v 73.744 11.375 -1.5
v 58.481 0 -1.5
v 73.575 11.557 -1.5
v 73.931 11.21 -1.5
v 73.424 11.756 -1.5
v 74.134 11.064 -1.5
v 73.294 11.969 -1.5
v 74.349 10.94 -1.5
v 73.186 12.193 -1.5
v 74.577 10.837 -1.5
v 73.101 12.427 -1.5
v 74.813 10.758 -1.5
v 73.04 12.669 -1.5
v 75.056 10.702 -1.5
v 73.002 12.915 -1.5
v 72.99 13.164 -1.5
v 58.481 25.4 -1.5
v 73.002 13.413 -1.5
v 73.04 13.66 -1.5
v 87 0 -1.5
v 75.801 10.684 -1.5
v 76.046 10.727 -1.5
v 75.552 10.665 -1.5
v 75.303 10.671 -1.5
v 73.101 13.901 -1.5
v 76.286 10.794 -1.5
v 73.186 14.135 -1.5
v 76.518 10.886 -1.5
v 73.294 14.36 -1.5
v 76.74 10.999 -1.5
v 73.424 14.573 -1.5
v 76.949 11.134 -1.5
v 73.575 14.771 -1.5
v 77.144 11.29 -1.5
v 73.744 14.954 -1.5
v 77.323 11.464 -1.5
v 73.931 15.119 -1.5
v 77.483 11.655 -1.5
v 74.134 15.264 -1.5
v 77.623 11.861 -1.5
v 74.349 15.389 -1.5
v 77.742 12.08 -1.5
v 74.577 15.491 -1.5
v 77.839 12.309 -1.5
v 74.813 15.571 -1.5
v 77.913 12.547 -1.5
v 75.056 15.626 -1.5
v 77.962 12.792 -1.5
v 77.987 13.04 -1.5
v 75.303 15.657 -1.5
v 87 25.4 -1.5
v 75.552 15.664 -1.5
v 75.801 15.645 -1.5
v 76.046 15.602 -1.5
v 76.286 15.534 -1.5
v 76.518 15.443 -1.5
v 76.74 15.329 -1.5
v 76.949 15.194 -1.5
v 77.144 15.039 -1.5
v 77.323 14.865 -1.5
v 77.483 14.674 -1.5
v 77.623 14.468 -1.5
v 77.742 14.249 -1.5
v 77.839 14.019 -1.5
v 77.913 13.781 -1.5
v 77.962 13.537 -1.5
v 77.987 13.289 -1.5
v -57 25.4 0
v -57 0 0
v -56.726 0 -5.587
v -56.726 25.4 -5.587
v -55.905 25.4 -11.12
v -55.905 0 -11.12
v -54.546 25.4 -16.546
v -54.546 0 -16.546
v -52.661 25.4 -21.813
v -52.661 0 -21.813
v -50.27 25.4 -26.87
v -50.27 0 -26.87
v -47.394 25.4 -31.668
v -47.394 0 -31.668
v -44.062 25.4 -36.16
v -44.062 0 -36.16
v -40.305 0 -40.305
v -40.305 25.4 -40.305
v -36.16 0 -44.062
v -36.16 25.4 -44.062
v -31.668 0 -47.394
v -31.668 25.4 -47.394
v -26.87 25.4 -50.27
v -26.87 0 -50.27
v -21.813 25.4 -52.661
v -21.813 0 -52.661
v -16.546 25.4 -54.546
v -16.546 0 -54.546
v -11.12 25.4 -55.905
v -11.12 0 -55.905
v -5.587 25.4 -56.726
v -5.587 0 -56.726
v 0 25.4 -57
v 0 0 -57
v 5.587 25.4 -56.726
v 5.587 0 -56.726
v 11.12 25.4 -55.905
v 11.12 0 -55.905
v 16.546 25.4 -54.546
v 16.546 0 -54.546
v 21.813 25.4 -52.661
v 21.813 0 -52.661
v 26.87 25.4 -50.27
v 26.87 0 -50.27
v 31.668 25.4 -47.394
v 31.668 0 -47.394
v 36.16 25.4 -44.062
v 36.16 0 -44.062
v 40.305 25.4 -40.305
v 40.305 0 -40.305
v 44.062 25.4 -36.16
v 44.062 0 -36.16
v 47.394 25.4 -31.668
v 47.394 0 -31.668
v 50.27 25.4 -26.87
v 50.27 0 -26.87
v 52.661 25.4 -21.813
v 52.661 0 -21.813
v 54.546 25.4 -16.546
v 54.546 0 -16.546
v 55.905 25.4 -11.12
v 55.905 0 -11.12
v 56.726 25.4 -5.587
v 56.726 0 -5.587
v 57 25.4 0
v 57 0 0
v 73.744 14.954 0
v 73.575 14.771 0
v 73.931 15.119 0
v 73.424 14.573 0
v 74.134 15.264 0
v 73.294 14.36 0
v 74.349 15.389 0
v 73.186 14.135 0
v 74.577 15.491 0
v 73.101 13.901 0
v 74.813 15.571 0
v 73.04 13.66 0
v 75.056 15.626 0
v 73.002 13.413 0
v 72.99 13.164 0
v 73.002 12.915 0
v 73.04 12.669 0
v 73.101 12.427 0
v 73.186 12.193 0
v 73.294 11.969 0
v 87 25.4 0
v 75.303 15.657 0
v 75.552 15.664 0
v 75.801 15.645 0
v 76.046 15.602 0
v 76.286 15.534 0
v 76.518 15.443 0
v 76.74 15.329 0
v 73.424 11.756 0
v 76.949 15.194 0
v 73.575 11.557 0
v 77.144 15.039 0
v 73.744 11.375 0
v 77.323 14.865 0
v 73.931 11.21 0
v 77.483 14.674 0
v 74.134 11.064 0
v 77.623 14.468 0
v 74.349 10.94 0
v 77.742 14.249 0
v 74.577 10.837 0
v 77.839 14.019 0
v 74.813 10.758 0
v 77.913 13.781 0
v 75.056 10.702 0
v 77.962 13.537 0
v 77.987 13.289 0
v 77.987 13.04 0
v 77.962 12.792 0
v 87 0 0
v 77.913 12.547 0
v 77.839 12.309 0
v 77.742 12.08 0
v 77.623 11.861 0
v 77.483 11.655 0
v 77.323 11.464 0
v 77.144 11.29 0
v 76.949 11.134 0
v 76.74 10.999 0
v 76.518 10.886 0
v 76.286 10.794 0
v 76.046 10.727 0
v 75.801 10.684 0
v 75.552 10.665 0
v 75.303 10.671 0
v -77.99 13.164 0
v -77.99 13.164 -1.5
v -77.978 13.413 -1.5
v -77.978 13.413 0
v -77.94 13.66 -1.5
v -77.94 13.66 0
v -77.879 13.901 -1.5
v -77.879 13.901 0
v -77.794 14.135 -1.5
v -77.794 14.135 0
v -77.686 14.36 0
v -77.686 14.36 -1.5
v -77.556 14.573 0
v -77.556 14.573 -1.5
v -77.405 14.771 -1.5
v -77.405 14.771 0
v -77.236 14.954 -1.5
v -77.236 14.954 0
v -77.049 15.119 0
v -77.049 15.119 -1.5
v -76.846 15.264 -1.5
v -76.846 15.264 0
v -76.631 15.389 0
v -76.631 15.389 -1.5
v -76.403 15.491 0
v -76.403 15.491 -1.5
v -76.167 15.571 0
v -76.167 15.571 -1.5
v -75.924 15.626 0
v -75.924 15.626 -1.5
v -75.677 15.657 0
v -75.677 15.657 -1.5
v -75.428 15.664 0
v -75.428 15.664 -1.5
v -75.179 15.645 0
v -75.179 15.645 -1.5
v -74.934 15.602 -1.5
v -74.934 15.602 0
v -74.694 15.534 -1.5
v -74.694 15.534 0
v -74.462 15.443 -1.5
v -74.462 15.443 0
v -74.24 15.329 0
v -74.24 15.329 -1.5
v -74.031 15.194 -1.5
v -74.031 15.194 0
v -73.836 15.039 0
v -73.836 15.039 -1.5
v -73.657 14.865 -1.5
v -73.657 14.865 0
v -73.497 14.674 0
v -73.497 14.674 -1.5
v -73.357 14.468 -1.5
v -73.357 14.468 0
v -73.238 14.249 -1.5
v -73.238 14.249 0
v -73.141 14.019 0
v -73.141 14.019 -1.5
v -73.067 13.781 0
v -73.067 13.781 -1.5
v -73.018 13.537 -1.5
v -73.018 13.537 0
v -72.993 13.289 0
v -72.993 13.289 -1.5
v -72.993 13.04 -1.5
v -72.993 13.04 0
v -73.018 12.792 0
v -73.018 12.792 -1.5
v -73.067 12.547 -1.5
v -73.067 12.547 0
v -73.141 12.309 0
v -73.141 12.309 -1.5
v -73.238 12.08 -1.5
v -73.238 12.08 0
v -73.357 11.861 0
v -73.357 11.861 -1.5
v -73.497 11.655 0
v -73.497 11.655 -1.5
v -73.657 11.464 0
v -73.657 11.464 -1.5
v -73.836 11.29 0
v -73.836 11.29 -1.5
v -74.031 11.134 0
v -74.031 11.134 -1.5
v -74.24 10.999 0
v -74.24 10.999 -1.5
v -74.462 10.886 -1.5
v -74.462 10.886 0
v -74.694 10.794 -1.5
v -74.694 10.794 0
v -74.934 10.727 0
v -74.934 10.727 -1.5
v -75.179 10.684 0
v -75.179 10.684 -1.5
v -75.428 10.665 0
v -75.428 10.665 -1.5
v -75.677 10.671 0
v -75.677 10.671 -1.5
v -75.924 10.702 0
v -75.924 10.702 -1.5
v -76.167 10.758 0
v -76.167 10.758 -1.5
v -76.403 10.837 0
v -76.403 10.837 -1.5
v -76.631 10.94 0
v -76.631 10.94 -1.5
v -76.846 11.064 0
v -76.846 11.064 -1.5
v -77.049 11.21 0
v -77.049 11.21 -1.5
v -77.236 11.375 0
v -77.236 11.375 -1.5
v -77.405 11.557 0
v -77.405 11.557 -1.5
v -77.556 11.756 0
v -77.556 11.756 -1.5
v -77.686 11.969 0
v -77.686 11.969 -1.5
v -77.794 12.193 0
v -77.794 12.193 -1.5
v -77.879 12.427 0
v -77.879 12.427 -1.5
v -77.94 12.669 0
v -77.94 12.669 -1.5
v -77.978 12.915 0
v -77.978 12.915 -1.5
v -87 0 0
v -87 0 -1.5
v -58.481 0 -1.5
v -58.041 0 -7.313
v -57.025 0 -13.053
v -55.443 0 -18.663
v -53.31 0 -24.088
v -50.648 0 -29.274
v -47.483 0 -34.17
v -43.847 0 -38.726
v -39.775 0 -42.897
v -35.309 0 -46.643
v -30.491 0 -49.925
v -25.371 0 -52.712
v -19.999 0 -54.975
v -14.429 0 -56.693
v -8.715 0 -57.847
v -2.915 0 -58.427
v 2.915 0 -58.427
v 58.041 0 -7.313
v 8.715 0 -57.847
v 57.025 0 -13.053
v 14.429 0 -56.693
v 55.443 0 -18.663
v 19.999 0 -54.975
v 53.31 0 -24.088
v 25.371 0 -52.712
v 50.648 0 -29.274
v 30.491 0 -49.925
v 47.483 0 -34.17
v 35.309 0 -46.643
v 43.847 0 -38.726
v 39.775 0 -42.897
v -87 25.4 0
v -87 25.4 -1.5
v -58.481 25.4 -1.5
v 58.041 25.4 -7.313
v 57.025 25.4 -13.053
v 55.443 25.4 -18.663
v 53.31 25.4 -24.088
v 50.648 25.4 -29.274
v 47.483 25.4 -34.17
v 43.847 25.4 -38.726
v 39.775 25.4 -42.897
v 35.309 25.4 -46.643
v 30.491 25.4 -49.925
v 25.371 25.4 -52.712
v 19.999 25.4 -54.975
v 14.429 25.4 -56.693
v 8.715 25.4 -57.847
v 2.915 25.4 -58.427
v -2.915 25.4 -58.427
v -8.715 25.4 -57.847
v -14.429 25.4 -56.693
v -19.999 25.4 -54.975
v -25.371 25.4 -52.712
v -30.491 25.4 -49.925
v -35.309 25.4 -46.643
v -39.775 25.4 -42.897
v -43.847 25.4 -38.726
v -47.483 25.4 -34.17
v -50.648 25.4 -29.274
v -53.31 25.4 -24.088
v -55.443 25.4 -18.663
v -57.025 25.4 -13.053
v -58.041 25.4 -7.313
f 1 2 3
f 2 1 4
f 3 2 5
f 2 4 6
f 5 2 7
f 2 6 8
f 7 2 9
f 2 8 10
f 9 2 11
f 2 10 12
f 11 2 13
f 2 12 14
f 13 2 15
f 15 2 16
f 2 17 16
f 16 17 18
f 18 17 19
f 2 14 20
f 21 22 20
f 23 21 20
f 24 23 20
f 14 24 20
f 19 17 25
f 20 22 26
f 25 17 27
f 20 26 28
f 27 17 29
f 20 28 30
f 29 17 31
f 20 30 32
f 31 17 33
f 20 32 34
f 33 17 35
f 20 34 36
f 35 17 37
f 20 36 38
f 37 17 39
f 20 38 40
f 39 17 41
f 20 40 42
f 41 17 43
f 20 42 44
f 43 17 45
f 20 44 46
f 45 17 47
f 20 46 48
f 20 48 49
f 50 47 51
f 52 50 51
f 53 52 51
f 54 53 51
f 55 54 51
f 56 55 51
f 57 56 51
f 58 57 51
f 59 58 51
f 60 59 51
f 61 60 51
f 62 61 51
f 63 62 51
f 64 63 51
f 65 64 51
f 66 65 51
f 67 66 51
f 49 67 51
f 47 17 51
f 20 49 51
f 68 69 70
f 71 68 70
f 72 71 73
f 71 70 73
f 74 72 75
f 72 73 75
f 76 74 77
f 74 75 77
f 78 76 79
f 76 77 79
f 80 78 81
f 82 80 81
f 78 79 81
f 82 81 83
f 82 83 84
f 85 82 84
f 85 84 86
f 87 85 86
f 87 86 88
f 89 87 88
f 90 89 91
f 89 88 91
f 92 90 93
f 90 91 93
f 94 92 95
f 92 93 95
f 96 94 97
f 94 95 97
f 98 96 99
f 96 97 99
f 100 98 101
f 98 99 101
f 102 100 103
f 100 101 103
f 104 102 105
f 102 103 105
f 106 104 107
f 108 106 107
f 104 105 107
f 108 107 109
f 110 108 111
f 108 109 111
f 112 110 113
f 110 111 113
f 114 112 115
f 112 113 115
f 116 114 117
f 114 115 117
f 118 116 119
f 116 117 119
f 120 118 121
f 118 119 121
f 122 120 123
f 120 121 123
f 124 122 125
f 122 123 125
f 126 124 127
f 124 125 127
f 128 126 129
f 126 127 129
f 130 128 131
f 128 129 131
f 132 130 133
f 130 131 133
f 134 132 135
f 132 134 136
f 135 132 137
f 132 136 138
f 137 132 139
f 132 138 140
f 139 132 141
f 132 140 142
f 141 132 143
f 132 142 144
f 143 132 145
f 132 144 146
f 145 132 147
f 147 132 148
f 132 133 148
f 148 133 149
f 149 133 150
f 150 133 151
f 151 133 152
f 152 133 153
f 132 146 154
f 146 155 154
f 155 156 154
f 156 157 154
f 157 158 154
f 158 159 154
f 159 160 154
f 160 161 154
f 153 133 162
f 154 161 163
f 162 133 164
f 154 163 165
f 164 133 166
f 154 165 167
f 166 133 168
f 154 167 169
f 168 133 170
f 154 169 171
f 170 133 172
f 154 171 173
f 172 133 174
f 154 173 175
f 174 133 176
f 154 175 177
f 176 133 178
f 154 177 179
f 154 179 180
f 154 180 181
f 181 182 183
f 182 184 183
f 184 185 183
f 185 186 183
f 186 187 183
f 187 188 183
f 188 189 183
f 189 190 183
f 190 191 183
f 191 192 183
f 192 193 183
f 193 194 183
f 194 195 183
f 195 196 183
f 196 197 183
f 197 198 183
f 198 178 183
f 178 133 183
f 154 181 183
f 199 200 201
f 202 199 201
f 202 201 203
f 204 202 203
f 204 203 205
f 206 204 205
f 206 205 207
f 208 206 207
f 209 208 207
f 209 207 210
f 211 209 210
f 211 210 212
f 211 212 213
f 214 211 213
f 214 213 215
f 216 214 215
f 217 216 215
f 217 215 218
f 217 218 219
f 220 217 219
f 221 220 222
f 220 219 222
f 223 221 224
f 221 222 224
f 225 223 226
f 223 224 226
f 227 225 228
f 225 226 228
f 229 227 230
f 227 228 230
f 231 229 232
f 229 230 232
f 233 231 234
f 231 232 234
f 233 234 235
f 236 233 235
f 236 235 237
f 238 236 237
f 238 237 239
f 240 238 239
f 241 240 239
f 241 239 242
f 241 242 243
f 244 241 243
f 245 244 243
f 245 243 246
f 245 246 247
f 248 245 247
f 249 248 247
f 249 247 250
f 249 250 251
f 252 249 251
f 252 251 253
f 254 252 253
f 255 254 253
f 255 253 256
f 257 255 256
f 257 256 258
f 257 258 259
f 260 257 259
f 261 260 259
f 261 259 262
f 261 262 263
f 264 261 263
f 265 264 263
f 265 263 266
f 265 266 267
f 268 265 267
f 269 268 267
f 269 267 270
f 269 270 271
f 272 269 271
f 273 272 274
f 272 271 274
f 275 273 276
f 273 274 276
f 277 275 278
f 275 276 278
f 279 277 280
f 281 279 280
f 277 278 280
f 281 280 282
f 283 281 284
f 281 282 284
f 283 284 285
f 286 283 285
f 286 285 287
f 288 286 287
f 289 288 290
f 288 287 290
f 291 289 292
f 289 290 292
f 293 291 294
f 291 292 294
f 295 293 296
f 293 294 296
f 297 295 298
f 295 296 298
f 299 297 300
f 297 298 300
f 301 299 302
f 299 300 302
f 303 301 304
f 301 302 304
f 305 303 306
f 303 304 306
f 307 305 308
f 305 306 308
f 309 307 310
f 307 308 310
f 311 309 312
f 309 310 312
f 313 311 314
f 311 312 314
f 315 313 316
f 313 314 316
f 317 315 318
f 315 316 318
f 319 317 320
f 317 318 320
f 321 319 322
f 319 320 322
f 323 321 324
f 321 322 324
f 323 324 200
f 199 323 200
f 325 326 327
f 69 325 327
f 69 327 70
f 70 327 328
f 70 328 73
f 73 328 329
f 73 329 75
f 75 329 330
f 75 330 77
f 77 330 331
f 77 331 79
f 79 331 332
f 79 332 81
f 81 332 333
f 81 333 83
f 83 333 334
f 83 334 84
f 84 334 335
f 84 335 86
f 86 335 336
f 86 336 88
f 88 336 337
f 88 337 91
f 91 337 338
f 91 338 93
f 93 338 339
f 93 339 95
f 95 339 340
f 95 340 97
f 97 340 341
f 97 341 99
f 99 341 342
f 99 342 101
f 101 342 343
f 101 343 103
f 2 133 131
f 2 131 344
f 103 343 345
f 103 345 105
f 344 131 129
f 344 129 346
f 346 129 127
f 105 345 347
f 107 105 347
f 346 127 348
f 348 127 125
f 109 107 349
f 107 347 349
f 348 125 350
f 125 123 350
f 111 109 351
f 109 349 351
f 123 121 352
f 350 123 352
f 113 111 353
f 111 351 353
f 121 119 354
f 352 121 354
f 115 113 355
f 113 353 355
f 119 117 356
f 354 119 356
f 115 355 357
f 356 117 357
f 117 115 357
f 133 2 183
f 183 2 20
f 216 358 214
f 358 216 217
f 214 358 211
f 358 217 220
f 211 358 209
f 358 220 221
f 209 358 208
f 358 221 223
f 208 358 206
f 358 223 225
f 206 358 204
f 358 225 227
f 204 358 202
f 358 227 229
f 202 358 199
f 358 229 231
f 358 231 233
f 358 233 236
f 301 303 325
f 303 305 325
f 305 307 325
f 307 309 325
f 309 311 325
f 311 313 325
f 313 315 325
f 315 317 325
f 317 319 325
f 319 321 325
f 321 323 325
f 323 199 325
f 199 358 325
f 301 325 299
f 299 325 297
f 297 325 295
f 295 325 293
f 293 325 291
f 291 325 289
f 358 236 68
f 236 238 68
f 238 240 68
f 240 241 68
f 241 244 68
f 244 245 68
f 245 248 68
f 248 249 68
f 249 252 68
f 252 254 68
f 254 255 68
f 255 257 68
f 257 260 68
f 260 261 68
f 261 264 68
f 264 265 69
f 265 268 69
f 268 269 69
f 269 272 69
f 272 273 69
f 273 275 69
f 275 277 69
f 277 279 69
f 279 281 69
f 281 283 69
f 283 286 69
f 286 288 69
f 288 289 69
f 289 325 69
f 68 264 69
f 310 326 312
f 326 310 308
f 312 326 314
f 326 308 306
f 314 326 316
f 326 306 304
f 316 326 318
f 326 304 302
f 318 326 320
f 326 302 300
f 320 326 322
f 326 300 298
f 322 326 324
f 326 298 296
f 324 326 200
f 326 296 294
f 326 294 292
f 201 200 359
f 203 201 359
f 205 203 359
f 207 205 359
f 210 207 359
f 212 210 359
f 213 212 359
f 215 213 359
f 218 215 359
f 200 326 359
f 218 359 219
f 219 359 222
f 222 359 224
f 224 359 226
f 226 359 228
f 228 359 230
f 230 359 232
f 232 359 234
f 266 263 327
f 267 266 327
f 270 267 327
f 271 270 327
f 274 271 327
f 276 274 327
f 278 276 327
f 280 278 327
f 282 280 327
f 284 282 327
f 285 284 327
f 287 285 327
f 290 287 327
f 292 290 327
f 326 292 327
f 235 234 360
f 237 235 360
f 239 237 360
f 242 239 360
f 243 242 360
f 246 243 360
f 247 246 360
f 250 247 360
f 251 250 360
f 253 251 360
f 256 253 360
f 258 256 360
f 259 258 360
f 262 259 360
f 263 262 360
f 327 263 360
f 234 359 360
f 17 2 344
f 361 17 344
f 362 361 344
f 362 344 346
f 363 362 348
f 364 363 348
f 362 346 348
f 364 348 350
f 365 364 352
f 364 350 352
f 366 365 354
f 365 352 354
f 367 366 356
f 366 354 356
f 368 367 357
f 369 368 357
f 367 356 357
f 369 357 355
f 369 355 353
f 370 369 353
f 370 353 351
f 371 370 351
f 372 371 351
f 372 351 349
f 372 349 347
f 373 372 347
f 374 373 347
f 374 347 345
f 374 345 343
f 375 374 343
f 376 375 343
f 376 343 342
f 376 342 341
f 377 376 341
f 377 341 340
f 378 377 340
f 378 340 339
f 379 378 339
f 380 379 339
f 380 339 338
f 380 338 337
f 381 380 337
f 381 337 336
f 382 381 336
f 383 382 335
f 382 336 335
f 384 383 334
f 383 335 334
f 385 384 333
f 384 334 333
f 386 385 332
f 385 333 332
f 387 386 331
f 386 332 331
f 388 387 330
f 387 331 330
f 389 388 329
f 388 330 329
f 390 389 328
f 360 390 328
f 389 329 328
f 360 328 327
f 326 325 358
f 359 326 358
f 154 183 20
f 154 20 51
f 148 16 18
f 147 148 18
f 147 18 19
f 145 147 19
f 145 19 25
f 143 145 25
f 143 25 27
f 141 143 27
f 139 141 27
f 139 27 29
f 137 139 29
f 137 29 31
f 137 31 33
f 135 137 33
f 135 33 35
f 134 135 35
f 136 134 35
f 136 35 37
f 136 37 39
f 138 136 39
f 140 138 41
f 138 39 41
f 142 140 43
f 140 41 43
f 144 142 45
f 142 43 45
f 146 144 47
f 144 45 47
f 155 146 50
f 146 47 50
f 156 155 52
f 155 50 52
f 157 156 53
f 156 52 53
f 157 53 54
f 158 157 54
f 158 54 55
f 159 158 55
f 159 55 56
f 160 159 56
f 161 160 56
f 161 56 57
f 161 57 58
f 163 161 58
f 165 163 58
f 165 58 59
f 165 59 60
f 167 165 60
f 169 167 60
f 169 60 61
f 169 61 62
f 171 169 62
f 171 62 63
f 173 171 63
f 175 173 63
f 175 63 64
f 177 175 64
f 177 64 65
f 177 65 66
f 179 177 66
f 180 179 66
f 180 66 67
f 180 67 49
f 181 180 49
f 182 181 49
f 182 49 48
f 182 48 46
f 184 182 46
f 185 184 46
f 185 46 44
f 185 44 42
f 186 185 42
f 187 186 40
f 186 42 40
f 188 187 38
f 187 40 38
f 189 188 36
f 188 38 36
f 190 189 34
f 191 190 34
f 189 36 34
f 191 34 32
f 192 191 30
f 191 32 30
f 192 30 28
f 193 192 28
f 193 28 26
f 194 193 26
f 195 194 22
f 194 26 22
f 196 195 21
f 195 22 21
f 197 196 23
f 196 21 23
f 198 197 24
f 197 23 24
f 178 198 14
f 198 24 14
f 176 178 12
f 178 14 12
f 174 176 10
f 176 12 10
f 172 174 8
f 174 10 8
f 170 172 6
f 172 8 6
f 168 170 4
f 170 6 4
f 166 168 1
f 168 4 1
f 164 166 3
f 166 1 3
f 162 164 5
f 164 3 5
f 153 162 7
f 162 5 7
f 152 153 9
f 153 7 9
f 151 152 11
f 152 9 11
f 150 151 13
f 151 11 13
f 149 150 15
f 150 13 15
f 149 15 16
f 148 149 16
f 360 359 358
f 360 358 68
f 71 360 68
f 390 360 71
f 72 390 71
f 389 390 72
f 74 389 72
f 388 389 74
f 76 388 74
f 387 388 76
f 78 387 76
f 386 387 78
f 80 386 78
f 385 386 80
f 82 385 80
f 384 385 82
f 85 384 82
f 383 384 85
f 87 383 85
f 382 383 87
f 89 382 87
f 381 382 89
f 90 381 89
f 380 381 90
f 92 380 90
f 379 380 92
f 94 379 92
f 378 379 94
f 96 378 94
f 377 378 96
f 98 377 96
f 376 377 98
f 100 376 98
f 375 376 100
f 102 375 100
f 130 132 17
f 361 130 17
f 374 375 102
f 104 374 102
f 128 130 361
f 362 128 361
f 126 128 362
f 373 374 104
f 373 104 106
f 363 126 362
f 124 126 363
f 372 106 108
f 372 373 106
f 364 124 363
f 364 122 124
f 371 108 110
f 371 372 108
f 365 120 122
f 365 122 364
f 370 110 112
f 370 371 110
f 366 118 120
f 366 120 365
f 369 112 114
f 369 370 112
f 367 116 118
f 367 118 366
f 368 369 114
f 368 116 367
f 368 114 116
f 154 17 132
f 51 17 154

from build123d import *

# Parameters (mm, degrees)
SALIENTE_EXTRUIR1_DEPTH = 25.4
CROQUIS2_W              = 30
CROQUIS2_H              = 25.4
SALIENTE_EXTRUIR2_DEPTH = 1.5
CROQUIS4_R              = 2.5
CORTAR_EXTRUIR1_DEPTH   = 10


with BuildPart() as part:
    # Croquis1 → Saliente-Extruir1 (new body)
    with BuildSketch(Plane(origin=(0, 0, 0), x_dir=(1, 0, 0), z_dir=(0, 1, 0))):
        with BuildLine():
            Line((-58.5, 0), (-57, 0))
            ThreePointArc((-57, 0), (0, 57), (57, 0))
            Line((57, 0), (58.5, 0))
            ThreePointArc((58.5, 0), (0, 58.5), (-58.5, 0))
        make_face()
    extrude(amount=SALIENTE_EXTRUIR1_DEPTH)

    # Croquis2 → Saliente-Extruir2 (add)
    with BuildSketch(Plane.XY):
        with Locations((72, 12.7)):
            Rectangle(CROQUIS2_W, CROQUIS2_H)
        with Locations((-72, 12.7)):
            Rectangle(CROQUIS2_W, CROQUIS2_H)
    extrude(amount=-SALIENTE_EXTRUIR2_DEPTH)

    # Croquis4 → Cortar-Extruir1 (cut)
    with BuildSketch(Plane(origin=(0, 0, -1.5), x_dir=(-1, 0, 0), z_dir=(0, 0, -1))):
        with Locations((75.49, 13.164314045)):
            Circle(CROQUIS4_R)
        with Locations((-75.49, 13.164314045)):
            Circle(CROQUIS4_R)
    extrude(amount=-CORTAR_EXTRUIR1_DEPTH, mode=Mode.SUBTRACT)


solid = part.part
